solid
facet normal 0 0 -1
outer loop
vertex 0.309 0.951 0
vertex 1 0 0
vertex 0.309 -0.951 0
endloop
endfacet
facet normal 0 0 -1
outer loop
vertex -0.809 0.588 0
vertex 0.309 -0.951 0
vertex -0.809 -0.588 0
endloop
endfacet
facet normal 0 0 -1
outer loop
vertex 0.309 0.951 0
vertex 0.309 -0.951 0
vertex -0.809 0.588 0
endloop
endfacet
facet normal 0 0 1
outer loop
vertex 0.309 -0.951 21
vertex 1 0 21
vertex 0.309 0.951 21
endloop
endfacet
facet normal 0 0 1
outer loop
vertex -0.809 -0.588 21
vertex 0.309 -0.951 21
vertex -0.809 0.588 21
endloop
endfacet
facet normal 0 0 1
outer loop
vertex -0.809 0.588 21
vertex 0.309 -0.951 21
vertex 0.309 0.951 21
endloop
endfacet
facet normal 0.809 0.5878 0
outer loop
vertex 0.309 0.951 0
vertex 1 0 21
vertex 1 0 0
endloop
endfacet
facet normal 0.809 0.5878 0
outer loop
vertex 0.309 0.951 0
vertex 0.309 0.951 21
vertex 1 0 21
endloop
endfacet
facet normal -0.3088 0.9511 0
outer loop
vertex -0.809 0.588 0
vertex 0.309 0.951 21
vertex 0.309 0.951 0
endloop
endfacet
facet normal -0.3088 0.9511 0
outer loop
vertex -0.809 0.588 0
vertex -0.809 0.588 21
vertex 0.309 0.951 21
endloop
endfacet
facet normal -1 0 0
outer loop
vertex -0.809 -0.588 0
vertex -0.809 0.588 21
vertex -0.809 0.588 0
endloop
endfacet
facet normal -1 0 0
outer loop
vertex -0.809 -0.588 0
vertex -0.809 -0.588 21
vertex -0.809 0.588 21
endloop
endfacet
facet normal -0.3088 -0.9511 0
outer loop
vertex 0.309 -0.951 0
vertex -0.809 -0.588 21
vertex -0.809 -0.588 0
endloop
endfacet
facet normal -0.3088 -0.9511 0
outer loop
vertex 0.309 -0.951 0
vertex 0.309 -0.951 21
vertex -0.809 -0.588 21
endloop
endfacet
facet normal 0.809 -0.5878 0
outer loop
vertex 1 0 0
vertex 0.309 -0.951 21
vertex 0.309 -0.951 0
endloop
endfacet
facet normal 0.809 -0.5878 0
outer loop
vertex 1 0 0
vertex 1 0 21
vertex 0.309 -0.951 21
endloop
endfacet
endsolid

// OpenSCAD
// Unit of length: Unit.MM
translate(v = [0.0, 0.0, 0.0])
{
   linear_extrude(height = 21.0, center = false, twist = 0.0, scale = 1.0)
   {
      circle(d = 2.0);
   }
}
